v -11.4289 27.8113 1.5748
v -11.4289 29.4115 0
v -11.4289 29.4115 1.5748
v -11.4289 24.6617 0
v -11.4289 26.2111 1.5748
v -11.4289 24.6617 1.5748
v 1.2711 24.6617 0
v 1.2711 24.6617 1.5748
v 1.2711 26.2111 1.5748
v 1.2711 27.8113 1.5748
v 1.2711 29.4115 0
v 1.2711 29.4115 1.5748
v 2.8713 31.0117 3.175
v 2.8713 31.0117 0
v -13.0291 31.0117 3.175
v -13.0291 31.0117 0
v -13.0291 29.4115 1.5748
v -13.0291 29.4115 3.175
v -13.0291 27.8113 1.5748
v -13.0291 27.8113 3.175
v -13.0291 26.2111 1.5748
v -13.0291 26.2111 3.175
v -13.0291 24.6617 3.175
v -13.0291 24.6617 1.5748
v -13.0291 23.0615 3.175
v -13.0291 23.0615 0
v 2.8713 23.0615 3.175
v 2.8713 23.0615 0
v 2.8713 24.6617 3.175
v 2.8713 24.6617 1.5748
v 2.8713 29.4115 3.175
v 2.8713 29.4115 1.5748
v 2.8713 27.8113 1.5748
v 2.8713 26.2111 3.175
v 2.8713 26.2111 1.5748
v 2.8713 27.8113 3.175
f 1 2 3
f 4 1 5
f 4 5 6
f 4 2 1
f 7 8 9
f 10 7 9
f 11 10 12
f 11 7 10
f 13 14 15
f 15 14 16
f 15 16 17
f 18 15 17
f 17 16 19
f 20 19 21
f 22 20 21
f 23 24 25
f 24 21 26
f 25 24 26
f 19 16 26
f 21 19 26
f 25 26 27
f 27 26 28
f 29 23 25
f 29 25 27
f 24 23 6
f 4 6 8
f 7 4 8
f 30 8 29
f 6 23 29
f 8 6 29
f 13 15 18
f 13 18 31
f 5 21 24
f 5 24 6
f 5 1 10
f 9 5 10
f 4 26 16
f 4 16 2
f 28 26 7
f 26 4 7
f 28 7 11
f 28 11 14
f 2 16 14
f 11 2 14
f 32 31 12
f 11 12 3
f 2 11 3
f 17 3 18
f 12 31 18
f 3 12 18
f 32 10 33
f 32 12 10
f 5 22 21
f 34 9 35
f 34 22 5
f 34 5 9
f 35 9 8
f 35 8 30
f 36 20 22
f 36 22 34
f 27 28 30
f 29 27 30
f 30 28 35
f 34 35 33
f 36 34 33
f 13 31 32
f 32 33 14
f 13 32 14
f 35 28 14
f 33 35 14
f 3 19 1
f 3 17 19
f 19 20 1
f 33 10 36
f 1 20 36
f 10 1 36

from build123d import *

# Parameters (mm, degrees)
F0_W     = 12.7
F0_H     = 1.6002
F0_H_2   = 1.5494
F0_W_2   = 1.6002
F1_DEPTH = 3.175
F2_T     = -1.6002
F3_DEPTH = 25.4
F4_W     = 12.7
F4_H     = 1.6002
F4_W_2   = 1.6002
F4_H_2   = 1.5494
F5_DEPTH = 1.6002


with BuildPart() as f1:
    # F0 (on Top) → F1 (new body)
    with BuildSketch(Plane.XY):
        with Locations((-5.0789434463, 30.2115620618)):
            Rectangle(F0_W, F0_H)
        with Locations((-5.0789434463, 28.6113620618)):
            Rectangle(F0_W, F0_H)
        with Locations((-5.0789434463, 25.4363620618)):
            Rectangle(F0_W, F0_H_2)
        with Locations((-5.0789434463, 23.8615620618)):
            Rectangle(F0_W, F0_H)
        with Locations((-5.0789434463, 27.0111620618)):
            Rectangle(F0_W, F0_H)
        with Locations((-12.2290434463, 30.2115620618)):
            Rectangle(F0_W_2, F0_H)
        with Locations((-12.2290434463, 27.0111620618)):
            Rectangle(F0_W_2, F0_H)
        with Locations((-12.2290434463, 23.8615620618)):
            Rectangle(F0_W_2, F0_H)
        with Locations((2.0711565537, 30.2115620618)):
            Rectangle(F0_W_2, F0_H)
        with Locations((2.0711565537, 27.0111620618)):
            Rectangle(F0_W_2, F0_H)
        with Locations((2.0711565537, 23.8615620618)):
            Rectangle(F0_W_2, F0_H)
        with Locations((-12.2290434463, 28.6113620618)):
            Rectangle(F0_W_2, F0_H)
        with Locations((-12.2290434463, 25.4363620618)):
            Rectangle(F0_W_2, F0_H_2)
        with Locations((2.0711565537, 28.6113620618)):
            Rectangle(F0_W_2, F0_H)
        with Locations((2.0711565537, 25.4363620618)):
            Rectangle(F0_W_2, F0_H_2)
    extrude(amount=F1_DEPTH)

    # F2
    f2_openings = [f1.faces().sort_by_distance(p)[0] for p in [
        (-5.078943, 27.036562, 0),
    ]]
    offset(amount=F2_T, openings=f2_openings)

    # F0 (on Top) → F3 (cut)
    with BuildSketch(Plane.XY):
        with Locations((-5.0789434463, 25.4363620618)):
            Rectangle(F0_W, F0_H_2)
        with Locations((-5.0789434463, 28.6113620618)):
            Rectangle(F0_W, F0_H)
    extrude(amount=F3_DEPTH, mode=Mode.SUBTRACT)

    # F4 (on face) → F5 (cut)
    with BuildSketch(Plane.XY.offset(3.175)):
        with Locations((-5.0789434463, 28.6113620618)):
            Rectangle(F4_W, F4_H)
        with Locations((2.0711565537, 28.6113620618)):
            Rectangle(F4_W_2, F4_H)
        with Locations((-12.2290434463, 28.6113620618)):
            Rectangle(F4_W_2, F4_H)
        with Locations((2.0711565537, 25.4363620618)):
            Rectangle(F4_W_2, F4_H_2)
        with Locations((-12.2290434463, 25.4363620618)):
            Rectangle(F4_W_2, F4_H_2)
    extrude(amount=-F5_DEPTH, mode=Mode.SUBTRACT)


solid = f1.part
